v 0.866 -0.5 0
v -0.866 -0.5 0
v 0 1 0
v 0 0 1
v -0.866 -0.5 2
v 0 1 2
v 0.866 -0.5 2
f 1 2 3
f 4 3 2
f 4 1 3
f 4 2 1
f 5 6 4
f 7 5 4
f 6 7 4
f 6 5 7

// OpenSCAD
h = 1;

// A cylinder with a triangular base and a slim waist which is collapsed into a single vertex.
// This is a non-manifold object since the collapsed vertices are not distinct.
polyhedron(
  points=[
    [0,1,0],
    [cos(210), sin(210),0],
    [cos(330), sin(330),0],

    [0,0,h],

    [0,1,2*h],
    [cos(210), sin(210),2*h],
    [cos(330), sin(330),2*h],
  ],
  faces=[
    [0,1,2],
    [1,0,3],
    [0,2,3],
    [2,1,3],

    [3,4,5],
    [3,5,6],
    [3,6,4],
    [6,5,4],
  ]);
